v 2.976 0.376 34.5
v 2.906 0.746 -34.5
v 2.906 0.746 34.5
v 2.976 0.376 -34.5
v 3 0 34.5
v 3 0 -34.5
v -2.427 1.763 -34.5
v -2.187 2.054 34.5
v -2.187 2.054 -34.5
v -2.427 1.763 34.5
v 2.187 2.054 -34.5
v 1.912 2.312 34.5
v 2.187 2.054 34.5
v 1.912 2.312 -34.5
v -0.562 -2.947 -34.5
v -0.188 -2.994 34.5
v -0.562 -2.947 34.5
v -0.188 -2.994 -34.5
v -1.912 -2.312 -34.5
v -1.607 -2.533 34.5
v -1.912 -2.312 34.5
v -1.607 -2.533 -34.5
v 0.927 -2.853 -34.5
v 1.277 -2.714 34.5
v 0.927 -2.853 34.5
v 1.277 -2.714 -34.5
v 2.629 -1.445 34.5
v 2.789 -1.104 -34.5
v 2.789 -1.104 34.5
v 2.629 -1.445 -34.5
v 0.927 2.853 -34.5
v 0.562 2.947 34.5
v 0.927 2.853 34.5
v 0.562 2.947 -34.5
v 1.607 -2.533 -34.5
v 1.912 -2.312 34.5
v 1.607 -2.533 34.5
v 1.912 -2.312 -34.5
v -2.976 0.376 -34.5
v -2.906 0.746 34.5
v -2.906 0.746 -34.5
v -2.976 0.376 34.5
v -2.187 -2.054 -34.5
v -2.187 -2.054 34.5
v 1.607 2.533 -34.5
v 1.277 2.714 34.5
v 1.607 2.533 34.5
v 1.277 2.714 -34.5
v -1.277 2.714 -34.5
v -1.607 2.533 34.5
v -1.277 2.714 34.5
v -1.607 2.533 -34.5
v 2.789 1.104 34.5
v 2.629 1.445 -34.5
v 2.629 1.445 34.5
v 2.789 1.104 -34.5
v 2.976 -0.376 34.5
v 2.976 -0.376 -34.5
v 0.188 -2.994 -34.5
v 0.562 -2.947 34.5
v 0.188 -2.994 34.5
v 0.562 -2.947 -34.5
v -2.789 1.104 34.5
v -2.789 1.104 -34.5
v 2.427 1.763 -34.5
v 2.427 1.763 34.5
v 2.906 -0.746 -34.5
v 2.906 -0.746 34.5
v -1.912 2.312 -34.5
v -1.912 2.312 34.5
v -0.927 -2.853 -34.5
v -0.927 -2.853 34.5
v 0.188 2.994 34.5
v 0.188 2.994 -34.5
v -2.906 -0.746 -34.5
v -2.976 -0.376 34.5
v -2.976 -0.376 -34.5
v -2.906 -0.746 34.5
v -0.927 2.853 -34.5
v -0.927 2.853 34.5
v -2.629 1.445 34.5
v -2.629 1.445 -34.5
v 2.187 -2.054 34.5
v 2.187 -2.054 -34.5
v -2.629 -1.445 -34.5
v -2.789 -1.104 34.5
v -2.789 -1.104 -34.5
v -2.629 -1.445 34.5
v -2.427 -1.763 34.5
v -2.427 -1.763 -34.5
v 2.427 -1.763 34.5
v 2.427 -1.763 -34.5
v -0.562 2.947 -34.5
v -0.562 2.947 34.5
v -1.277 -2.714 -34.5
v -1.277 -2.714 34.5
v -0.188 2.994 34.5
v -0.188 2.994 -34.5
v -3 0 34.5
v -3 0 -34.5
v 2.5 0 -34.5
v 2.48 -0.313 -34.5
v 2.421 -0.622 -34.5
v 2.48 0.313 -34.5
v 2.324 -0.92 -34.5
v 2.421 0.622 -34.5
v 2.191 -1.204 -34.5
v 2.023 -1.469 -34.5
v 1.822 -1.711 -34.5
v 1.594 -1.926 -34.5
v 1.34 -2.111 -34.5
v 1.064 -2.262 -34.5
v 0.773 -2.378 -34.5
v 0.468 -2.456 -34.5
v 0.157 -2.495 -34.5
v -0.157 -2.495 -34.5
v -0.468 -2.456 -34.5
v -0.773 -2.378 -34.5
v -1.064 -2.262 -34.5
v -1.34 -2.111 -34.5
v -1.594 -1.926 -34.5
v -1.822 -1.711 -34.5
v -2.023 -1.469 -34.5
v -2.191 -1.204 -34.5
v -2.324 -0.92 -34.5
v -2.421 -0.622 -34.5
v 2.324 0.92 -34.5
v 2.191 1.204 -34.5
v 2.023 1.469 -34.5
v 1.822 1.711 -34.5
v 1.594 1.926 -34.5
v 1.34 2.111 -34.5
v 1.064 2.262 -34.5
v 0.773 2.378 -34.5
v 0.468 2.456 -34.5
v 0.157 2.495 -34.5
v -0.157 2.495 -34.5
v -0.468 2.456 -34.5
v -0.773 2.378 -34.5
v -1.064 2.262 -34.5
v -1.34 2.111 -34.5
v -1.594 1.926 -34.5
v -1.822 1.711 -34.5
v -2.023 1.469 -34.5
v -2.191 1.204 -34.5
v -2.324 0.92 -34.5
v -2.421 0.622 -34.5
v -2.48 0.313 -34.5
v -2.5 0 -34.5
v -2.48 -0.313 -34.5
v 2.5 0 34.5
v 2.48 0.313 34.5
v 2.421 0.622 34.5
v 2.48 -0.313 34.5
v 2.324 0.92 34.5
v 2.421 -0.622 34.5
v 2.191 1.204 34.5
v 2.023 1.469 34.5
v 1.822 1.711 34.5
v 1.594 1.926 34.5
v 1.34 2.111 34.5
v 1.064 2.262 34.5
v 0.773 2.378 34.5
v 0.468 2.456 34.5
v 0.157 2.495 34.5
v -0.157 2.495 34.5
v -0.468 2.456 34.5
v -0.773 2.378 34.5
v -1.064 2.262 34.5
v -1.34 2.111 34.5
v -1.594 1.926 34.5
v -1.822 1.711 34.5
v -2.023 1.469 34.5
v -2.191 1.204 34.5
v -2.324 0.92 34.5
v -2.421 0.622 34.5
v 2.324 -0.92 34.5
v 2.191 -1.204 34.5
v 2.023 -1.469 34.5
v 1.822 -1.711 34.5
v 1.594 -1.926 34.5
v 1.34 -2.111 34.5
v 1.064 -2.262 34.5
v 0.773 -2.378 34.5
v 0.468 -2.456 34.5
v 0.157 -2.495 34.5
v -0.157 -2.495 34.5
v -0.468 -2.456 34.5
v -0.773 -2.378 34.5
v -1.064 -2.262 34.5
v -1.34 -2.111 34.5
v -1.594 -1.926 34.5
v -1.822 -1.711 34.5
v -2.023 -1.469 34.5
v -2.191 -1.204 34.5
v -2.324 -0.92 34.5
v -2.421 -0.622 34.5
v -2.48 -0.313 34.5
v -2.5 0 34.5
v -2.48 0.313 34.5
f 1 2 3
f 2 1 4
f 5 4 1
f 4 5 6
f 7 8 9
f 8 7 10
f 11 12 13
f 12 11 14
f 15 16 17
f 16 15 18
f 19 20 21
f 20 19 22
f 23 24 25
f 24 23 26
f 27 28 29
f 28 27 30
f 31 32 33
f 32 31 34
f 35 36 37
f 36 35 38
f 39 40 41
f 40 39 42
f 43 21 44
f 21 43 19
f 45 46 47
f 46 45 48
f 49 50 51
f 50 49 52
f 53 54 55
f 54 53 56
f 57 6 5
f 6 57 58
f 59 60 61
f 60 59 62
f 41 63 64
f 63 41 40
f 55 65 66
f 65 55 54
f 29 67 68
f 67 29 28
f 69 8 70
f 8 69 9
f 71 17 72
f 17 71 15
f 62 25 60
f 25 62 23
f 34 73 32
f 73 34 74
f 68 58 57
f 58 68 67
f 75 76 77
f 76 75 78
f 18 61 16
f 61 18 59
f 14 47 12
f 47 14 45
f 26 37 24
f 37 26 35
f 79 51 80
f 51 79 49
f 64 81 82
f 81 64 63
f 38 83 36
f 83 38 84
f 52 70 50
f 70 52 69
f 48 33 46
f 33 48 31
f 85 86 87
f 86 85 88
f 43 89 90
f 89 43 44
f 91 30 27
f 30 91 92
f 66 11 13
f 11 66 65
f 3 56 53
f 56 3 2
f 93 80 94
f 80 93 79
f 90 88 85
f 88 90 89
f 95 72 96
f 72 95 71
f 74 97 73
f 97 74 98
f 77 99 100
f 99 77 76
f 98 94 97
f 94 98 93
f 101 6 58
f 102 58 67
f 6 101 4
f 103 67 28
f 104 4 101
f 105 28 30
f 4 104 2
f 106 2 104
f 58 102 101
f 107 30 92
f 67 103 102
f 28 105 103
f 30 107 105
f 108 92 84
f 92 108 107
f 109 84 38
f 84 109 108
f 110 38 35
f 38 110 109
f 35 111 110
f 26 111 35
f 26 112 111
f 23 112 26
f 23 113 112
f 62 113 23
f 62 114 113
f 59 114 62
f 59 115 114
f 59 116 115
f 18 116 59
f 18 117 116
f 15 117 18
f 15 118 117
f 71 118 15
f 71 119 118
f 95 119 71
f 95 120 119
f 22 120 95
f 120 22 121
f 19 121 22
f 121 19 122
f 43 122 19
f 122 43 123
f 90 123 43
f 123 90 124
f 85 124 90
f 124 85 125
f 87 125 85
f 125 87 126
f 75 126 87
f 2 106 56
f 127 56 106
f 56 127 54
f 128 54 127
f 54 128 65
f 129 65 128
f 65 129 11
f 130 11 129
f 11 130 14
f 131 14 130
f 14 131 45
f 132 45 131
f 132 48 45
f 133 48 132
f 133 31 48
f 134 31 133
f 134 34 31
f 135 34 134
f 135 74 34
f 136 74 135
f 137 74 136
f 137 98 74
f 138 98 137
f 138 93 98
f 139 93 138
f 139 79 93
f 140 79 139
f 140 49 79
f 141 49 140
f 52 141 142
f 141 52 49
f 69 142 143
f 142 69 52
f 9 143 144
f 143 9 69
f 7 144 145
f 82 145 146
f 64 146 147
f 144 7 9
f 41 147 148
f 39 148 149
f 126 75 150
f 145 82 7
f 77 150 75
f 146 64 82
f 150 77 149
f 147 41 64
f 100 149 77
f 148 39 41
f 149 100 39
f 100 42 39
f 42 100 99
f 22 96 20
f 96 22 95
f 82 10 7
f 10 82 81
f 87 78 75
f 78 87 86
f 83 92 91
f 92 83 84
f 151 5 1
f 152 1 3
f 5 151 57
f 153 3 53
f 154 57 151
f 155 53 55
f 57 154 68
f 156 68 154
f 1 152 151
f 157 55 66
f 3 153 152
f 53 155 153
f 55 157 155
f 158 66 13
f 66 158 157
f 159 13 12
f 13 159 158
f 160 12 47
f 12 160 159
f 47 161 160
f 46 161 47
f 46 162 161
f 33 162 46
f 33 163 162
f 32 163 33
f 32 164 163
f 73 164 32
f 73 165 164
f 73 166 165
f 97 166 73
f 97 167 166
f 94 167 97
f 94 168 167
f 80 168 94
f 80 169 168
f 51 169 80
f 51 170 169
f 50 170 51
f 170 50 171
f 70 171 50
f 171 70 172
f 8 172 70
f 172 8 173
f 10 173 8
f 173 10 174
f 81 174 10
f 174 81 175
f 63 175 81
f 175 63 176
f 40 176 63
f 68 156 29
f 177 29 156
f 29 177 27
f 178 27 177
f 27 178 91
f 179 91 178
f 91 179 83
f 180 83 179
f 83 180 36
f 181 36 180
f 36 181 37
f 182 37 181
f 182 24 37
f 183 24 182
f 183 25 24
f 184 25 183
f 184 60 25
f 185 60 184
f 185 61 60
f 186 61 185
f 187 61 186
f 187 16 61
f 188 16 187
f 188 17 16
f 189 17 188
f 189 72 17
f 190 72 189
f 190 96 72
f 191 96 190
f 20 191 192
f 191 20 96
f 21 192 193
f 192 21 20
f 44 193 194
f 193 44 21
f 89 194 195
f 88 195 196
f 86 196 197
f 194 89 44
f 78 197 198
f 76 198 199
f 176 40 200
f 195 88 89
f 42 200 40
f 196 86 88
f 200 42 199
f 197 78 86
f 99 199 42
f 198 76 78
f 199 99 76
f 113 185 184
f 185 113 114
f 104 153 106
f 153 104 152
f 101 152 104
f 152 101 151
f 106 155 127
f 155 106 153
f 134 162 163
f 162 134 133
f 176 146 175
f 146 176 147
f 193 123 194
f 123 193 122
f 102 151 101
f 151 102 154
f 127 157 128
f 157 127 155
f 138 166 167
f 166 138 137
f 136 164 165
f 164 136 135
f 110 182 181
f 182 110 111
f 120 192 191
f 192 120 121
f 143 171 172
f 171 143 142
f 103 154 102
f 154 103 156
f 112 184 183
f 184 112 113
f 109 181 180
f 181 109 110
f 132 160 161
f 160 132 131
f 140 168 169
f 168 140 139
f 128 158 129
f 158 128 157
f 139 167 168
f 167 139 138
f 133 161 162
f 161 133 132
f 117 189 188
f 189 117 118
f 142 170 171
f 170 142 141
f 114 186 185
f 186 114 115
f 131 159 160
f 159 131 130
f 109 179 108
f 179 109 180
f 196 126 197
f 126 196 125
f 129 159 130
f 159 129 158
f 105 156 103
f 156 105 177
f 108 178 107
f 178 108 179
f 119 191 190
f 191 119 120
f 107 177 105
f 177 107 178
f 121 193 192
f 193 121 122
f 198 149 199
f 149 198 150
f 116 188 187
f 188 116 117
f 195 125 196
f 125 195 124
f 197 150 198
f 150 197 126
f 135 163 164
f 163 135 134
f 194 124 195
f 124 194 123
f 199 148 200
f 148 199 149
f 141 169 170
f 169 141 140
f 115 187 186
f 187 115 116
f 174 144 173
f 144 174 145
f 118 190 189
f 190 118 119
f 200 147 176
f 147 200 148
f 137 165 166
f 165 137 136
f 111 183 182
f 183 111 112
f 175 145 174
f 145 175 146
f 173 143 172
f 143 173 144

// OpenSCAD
$fn = 50;


difference() {
	union() {
		translate(v = [0, 0, -34.5000000000]) {
			cylinder(h = 69, r = 3.0000000000);
		}
	}
	union() {
		translate(v = [0, 0, -100.0000000000]) {
			cylinder(h = 200, r = 2.5000000000);
		}
	}
}
